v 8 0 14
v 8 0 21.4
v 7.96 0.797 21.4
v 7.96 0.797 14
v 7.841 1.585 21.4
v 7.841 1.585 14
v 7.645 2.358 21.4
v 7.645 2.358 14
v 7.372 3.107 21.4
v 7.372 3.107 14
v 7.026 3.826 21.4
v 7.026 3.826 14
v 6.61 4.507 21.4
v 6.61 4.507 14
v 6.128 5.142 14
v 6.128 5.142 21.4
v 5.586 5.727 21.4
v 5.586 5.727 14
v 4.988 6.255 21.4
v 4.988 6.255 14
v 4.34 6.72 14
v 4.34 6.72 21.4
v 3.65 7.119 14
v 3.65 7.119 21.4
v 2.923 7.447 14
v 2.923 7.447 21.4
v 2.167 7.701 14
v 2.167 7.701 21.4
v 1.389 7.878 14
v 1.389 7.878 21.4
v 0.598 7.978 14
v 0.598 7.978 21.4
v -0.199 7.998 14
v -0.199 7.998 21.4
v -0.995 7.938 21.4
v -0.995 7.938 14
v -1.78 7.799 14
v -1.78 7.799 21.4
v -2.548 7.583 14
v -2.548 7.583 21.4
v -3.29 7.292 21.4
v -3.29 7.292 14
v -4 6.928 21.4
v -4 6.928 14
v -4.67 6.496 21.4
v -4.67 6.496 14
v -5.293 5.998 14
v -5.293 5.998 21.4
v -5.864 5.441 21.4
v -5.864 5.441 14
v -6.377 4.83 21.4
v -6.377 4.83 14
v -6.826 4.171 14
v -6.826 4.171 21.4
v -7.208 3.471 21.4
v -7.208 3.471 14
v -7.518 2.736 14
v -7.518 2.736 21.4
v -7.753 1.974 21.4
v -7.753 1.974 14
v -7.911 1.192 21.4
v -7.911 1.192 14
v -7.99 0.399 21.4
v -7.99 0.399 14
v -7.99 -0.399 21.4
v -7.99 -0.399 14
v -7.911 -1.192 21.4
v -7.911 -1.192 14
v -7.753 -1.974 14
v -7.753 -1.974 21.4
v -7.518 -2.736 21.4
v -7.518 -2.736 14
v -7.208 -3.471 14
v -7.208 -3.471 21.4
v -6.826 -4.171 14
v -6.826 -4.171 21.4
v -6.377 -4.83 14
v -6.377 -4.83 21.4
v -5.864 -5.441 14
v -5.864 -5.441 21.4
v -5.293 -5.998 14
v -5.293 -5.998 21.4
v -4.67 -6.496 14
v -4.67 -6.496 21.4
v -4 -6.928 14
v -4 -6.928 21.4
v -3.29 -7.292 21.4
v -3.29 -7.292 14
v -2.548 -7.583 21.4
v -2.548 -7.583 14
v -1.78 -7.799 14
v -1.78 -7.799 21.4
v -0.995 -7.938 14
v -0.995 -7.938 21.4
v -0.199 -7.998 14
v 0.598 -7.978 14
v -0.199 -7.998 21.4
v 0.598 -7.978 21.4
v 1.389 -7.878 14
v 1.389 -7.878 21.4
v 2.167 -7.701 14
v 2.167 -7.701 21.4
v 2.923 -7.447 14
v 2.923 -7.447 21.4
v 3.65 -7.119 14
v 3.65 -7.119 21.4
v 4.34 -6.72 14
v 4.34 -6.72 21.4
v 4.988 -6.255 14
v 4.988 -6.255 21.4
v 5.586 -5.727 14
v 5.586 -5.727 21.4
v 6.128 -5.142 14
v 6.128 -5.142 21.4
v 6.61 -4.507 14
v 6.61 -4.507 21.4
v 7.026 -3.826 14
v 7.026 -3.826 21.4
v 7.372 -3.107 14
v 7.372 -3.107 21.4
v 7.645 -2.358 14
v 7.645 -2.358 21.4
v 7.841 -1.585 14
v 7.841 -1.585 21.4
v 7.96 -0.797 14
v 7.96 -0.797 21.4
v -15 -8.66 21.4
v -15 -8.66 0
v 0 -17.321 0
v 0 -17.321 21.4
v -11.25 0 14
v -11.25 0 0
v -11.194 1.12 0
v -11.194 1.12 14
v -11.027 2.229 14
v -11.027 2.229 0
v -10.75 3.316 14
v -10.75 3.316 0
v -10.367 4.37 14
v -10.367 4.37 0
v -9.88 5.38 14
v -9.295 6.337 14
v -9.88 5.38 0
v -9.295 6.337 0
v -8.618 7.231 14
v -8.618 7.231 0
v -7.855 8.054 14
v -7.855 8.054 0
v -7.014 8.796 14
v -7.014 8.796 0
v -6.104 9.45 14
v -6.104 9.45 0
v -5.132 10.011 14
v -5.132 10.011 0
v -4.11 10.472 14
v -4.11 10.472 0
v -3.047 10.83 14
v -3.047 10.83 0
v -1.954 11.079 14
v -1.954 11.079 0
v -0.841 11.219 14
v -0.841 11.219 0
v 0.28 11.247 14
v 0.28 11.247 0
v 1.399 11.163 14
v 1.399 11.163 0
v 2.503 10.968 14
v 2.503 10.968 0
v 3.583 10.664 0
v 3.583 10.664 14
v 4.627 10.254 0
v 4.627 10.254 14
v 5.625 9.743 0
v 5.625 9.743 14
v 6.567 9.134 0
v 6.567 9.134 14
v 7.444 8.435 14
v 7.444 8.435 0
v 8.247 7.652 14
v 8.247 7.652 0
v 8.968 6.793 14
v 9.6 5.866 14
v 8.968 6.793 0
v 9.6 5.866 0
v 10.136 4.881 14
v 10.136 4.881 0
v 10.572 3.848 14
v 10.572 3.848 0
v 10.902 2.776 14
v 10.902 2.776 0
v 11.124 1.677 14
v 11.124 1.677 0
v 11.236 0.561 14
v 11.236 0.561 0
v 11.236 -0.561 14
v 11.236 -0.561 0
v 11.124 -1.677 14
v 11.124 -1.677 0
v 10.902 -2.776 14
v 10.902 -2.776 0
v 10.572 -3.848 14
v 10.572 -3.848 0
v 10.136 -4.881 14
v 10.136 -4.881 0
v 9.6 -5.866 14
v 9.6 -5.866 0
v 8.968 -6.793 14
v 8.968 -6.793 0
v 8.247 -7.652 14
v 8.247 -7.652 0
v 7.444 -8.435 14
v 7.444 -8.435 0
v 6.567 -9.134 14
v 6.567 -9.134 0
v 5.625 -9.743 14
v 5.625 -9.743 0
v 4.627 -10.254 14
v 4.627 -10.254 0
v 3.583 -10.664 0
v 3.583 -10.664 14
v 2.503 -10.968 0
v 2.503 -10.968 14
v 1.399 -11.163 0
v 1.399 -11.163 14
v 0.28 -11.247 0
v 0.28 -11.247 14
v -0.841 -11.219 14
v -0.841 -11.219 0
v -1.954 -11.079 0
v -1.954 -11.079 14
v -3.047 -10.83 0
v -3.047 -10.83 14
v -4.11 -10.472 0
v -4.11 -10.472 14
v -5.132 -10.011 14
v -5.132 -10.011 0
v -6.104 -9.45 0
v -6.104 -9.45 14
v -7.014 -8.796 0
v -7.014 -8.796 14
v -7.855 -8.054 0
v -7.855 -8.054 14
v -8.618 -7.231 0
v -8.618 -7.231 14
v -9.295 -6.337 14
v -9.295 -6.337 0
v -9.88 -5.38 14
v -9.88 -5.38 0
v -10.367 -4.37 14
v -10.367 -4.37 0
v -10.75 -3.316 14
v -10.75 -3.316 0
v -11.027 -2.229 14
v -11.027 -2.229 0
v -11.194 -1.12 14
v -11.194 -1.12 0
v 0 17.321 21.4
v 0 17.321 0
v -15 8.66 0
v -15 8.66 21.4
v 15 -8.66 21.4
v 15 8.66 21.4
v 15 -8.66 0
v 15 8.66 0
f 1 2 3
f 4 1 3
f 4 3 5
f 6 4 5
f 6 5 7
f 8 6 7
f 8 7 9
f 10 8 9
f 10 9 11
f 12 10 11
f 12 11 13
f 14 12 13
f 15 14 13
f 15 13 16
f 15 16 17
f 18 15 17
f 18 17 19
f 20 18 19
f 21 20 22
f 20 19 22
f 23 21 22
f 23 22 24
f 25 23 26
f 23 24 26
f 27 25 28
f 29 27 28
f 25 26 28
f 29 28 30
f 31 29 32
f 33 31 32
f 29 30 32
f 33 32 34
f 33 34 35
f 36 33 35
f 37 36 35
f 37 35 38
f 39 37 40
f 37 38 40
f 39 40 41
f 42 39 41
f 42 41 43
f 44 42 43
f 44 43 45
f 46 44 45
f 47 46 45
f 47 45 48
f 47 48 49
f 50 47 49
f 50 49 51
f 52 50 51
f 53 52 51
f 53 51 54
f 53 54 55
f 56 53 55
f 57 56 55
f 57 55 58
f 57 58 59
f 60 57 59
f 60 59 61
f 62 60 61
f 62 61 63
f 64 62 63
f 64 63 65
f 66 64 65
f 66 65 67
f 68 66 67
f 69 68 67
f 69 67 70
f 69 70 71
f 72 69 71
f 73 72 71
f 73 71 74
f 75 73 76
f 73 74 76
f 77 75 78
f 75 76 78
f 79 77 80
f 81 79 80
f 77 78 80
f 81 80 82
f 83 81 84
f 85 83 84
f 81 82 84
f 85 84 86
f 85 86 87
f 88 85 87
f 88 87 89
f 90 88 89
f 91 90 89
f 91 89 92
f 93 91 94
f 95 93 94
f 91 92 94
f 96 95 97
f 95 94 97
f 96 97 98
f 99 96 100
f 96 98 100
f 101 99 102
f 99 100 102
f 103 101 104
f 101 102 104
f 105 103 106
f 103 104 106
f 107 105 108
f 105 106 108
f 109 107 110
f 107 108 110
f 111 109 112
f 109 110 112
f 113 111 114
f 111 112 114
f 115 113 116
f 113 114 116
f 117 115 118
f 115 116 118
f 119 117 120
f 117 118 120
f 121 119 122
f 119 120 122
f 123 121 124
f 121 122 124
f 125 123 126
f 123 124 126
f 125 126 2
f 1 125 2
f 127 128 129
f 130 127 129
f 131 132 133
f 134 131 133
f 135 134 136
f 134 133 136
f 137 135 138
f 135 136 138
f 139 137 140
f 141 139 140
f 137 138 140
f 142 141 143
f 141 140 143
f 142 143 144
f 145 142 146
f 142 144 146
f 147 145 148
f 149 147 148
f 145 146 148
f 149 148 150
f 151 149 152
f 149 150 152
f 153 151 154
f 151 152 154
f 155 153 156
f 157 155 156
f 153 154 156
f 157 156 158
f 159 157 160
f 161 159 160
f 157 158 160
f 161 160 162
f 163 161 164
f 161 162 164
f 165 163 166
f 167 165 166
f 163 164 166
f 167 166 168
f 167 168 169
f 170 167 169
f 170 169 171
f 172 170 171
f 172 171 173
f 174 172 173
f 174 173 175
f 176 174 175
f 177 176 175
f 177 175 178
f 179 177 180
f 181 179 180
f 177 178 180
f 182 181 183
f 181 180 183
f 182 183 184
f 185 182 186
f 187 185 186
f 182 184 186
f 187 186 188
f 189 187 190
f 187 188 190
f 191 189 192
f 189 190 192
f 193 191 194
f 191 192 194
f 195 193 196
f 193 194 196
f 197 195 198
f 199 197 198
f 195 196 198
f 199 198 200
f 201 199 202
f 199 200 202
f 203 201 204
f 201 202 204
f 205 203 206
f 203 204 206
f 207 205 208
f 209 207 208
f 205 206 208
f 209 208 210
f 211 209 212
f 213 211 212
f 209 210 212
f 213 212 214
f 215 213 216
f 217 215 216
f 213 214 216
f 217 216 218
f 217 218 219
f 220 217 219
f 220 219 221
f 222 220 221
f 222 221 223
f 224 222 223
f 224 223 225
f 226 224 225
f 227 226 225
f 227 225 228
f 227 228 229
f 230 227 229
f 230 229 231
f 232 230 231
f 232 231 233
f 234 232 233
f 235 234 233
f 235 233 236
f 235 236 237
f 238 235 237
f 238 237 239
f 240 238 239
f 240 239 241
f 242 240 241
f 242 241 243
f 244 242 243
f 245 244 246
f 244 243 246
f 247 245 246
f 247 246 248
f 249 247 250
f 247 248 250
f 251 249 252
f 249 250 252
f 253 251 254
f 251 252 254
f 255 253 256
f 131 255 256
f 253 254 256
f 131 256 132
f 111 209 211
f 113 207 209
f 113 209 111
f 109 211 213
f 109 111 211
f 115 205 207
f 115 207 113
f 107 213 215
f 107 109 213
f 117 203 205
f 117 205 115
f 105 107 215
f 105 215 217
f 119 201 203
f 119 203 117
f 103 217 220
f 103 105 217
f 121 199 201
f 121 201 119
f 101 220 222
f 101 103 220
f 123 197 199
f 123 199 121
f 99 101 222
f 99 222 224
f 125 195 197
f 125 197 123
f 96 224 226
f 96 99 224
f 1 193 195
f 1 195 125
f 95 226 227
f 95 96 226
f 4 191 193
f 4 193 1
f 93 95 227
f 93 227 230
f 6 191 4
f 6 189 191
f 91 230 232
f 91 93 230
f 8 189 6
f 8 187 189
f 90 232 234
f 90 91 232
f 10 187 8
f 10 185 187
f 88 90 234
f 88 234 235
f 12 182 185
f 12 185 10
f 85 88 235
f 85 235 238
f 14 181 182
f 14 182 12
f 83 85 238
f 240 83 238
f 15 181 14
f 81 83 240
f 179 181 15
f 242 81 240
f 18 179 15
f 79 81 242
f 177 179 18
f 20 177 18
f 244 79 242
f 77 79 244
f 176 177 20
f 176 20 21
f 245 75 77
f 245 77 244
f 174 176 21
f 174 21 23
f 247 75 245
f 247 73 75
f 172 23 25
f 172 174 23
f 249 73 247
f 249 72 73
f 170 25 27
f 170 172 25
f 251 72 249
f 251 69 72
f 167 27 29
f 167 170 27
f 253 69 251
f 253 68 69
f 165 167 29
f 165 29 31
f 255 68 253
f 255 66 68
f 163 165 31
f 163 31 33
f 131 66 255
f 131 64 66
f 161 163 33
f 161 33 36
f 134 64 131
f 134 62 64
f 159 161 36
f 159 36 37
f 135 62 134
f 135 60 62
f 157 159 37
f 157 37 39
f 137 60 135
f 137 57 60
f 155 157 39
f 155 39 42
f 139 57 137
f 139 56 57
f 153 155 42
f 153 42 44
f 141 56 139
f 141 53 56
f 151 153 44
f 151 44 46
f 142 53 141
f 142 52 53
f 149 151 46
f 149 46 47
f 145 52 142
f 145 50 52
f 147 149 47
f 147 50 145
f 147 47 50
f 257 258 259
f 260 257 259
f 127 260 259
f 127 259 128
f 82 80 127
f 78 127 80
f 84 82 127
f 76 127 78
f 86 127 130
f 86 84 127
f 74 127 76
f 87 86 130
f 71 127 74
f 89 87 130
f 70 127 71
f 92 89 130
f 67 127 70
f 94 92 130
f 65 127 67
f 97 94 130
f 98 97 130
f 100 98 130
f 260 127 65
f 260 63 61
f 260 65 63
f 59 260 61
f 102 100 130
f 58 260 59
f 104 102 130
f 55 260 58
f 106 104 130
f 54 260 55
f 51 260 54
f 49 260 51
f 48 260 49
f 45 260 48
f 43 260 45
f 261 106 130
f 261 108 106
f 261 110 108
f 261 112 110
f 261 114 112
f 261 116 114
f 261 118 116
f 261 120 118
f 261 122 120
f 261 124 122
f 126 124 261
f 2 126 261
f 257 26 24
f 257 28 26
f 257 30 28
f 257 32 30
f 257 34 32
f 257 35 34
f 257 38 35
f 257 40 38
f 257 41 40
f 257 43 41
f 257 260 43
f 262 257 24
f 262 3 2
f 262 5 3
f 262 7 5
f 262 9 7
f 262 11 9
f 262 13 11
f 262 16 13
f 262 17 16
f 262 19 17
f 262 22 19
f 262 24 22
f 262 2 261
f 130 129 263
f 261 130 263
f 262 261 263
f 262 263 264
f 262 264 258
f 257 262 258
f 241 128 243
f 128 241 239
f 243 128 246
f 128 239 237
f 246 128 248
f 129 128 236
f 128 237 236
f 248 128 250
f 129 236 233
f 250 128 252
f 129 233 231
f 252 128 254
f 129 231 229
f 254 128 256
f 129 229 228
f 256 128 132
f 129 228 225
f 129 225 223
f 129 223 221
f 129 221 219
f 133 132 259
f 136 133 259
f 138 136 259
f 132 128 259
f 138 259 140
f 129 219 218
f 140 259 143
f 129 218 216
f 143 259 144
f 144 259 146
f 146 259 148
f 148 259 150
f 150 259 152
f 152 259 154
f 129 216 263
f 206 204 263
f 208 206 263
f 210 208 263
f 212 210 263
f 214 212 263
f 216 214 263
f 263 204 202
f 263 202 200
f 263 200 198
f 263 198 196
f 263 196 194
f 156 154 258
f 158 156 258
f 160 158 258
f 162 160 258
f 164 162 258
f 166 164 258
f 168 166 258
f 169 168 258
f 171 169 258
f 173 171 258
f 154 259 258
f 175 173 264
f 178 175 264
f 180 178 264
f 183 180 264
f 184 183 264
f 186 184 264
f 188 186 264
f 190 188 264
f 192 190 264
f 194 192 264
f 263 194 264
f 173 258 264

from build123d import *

# Parameters (mm, degrees)
BASE_EXTRUDE_DEPTH = 21.4
SKETCH2_R          = 11.25
CUT_EXTRUDE1_DEPTH = 14
SKETCH3_R          = 8
CUT_EXTRUDE2_DEPTH = 22.4


with BuildPart() as part:
    # Sketch1 → Base-Extrude (new body)
    with BuildSketch(Plane.XY):
        Polygon((0, 17.320508076), (-15, 8.660254038), (-15, -8.660254038), (0, -17.320508076), (15, -8.660254038), (15, 8.660254038), align=None)
    extrude(amount=BASE_EXTRUDE_DEPTH)

    # Sketch2 → Cut-Extrude1 (cut)
    with BuildSketch(Plane(origin=(0, 0, 0), x_dir=(-1, 0, 0), z_dir=(0, 0, -1))):
        Circle(SKETCH2_R)
    extrude(amount=-CUT_EXTRUDE1_DEPTH, mode=Mode.SUBTRACT)

    # Sketch3 → Cut-Extrude2 (cut, through all)
    with BuildSketch(Plane.XY.offset(21.4)):
        Circle(SKETCH3_R)
    extrude(amount=-CUT_EXTRUDE2_DEPTH, mode=Mode.SUBTRACT)


solid = part.part
